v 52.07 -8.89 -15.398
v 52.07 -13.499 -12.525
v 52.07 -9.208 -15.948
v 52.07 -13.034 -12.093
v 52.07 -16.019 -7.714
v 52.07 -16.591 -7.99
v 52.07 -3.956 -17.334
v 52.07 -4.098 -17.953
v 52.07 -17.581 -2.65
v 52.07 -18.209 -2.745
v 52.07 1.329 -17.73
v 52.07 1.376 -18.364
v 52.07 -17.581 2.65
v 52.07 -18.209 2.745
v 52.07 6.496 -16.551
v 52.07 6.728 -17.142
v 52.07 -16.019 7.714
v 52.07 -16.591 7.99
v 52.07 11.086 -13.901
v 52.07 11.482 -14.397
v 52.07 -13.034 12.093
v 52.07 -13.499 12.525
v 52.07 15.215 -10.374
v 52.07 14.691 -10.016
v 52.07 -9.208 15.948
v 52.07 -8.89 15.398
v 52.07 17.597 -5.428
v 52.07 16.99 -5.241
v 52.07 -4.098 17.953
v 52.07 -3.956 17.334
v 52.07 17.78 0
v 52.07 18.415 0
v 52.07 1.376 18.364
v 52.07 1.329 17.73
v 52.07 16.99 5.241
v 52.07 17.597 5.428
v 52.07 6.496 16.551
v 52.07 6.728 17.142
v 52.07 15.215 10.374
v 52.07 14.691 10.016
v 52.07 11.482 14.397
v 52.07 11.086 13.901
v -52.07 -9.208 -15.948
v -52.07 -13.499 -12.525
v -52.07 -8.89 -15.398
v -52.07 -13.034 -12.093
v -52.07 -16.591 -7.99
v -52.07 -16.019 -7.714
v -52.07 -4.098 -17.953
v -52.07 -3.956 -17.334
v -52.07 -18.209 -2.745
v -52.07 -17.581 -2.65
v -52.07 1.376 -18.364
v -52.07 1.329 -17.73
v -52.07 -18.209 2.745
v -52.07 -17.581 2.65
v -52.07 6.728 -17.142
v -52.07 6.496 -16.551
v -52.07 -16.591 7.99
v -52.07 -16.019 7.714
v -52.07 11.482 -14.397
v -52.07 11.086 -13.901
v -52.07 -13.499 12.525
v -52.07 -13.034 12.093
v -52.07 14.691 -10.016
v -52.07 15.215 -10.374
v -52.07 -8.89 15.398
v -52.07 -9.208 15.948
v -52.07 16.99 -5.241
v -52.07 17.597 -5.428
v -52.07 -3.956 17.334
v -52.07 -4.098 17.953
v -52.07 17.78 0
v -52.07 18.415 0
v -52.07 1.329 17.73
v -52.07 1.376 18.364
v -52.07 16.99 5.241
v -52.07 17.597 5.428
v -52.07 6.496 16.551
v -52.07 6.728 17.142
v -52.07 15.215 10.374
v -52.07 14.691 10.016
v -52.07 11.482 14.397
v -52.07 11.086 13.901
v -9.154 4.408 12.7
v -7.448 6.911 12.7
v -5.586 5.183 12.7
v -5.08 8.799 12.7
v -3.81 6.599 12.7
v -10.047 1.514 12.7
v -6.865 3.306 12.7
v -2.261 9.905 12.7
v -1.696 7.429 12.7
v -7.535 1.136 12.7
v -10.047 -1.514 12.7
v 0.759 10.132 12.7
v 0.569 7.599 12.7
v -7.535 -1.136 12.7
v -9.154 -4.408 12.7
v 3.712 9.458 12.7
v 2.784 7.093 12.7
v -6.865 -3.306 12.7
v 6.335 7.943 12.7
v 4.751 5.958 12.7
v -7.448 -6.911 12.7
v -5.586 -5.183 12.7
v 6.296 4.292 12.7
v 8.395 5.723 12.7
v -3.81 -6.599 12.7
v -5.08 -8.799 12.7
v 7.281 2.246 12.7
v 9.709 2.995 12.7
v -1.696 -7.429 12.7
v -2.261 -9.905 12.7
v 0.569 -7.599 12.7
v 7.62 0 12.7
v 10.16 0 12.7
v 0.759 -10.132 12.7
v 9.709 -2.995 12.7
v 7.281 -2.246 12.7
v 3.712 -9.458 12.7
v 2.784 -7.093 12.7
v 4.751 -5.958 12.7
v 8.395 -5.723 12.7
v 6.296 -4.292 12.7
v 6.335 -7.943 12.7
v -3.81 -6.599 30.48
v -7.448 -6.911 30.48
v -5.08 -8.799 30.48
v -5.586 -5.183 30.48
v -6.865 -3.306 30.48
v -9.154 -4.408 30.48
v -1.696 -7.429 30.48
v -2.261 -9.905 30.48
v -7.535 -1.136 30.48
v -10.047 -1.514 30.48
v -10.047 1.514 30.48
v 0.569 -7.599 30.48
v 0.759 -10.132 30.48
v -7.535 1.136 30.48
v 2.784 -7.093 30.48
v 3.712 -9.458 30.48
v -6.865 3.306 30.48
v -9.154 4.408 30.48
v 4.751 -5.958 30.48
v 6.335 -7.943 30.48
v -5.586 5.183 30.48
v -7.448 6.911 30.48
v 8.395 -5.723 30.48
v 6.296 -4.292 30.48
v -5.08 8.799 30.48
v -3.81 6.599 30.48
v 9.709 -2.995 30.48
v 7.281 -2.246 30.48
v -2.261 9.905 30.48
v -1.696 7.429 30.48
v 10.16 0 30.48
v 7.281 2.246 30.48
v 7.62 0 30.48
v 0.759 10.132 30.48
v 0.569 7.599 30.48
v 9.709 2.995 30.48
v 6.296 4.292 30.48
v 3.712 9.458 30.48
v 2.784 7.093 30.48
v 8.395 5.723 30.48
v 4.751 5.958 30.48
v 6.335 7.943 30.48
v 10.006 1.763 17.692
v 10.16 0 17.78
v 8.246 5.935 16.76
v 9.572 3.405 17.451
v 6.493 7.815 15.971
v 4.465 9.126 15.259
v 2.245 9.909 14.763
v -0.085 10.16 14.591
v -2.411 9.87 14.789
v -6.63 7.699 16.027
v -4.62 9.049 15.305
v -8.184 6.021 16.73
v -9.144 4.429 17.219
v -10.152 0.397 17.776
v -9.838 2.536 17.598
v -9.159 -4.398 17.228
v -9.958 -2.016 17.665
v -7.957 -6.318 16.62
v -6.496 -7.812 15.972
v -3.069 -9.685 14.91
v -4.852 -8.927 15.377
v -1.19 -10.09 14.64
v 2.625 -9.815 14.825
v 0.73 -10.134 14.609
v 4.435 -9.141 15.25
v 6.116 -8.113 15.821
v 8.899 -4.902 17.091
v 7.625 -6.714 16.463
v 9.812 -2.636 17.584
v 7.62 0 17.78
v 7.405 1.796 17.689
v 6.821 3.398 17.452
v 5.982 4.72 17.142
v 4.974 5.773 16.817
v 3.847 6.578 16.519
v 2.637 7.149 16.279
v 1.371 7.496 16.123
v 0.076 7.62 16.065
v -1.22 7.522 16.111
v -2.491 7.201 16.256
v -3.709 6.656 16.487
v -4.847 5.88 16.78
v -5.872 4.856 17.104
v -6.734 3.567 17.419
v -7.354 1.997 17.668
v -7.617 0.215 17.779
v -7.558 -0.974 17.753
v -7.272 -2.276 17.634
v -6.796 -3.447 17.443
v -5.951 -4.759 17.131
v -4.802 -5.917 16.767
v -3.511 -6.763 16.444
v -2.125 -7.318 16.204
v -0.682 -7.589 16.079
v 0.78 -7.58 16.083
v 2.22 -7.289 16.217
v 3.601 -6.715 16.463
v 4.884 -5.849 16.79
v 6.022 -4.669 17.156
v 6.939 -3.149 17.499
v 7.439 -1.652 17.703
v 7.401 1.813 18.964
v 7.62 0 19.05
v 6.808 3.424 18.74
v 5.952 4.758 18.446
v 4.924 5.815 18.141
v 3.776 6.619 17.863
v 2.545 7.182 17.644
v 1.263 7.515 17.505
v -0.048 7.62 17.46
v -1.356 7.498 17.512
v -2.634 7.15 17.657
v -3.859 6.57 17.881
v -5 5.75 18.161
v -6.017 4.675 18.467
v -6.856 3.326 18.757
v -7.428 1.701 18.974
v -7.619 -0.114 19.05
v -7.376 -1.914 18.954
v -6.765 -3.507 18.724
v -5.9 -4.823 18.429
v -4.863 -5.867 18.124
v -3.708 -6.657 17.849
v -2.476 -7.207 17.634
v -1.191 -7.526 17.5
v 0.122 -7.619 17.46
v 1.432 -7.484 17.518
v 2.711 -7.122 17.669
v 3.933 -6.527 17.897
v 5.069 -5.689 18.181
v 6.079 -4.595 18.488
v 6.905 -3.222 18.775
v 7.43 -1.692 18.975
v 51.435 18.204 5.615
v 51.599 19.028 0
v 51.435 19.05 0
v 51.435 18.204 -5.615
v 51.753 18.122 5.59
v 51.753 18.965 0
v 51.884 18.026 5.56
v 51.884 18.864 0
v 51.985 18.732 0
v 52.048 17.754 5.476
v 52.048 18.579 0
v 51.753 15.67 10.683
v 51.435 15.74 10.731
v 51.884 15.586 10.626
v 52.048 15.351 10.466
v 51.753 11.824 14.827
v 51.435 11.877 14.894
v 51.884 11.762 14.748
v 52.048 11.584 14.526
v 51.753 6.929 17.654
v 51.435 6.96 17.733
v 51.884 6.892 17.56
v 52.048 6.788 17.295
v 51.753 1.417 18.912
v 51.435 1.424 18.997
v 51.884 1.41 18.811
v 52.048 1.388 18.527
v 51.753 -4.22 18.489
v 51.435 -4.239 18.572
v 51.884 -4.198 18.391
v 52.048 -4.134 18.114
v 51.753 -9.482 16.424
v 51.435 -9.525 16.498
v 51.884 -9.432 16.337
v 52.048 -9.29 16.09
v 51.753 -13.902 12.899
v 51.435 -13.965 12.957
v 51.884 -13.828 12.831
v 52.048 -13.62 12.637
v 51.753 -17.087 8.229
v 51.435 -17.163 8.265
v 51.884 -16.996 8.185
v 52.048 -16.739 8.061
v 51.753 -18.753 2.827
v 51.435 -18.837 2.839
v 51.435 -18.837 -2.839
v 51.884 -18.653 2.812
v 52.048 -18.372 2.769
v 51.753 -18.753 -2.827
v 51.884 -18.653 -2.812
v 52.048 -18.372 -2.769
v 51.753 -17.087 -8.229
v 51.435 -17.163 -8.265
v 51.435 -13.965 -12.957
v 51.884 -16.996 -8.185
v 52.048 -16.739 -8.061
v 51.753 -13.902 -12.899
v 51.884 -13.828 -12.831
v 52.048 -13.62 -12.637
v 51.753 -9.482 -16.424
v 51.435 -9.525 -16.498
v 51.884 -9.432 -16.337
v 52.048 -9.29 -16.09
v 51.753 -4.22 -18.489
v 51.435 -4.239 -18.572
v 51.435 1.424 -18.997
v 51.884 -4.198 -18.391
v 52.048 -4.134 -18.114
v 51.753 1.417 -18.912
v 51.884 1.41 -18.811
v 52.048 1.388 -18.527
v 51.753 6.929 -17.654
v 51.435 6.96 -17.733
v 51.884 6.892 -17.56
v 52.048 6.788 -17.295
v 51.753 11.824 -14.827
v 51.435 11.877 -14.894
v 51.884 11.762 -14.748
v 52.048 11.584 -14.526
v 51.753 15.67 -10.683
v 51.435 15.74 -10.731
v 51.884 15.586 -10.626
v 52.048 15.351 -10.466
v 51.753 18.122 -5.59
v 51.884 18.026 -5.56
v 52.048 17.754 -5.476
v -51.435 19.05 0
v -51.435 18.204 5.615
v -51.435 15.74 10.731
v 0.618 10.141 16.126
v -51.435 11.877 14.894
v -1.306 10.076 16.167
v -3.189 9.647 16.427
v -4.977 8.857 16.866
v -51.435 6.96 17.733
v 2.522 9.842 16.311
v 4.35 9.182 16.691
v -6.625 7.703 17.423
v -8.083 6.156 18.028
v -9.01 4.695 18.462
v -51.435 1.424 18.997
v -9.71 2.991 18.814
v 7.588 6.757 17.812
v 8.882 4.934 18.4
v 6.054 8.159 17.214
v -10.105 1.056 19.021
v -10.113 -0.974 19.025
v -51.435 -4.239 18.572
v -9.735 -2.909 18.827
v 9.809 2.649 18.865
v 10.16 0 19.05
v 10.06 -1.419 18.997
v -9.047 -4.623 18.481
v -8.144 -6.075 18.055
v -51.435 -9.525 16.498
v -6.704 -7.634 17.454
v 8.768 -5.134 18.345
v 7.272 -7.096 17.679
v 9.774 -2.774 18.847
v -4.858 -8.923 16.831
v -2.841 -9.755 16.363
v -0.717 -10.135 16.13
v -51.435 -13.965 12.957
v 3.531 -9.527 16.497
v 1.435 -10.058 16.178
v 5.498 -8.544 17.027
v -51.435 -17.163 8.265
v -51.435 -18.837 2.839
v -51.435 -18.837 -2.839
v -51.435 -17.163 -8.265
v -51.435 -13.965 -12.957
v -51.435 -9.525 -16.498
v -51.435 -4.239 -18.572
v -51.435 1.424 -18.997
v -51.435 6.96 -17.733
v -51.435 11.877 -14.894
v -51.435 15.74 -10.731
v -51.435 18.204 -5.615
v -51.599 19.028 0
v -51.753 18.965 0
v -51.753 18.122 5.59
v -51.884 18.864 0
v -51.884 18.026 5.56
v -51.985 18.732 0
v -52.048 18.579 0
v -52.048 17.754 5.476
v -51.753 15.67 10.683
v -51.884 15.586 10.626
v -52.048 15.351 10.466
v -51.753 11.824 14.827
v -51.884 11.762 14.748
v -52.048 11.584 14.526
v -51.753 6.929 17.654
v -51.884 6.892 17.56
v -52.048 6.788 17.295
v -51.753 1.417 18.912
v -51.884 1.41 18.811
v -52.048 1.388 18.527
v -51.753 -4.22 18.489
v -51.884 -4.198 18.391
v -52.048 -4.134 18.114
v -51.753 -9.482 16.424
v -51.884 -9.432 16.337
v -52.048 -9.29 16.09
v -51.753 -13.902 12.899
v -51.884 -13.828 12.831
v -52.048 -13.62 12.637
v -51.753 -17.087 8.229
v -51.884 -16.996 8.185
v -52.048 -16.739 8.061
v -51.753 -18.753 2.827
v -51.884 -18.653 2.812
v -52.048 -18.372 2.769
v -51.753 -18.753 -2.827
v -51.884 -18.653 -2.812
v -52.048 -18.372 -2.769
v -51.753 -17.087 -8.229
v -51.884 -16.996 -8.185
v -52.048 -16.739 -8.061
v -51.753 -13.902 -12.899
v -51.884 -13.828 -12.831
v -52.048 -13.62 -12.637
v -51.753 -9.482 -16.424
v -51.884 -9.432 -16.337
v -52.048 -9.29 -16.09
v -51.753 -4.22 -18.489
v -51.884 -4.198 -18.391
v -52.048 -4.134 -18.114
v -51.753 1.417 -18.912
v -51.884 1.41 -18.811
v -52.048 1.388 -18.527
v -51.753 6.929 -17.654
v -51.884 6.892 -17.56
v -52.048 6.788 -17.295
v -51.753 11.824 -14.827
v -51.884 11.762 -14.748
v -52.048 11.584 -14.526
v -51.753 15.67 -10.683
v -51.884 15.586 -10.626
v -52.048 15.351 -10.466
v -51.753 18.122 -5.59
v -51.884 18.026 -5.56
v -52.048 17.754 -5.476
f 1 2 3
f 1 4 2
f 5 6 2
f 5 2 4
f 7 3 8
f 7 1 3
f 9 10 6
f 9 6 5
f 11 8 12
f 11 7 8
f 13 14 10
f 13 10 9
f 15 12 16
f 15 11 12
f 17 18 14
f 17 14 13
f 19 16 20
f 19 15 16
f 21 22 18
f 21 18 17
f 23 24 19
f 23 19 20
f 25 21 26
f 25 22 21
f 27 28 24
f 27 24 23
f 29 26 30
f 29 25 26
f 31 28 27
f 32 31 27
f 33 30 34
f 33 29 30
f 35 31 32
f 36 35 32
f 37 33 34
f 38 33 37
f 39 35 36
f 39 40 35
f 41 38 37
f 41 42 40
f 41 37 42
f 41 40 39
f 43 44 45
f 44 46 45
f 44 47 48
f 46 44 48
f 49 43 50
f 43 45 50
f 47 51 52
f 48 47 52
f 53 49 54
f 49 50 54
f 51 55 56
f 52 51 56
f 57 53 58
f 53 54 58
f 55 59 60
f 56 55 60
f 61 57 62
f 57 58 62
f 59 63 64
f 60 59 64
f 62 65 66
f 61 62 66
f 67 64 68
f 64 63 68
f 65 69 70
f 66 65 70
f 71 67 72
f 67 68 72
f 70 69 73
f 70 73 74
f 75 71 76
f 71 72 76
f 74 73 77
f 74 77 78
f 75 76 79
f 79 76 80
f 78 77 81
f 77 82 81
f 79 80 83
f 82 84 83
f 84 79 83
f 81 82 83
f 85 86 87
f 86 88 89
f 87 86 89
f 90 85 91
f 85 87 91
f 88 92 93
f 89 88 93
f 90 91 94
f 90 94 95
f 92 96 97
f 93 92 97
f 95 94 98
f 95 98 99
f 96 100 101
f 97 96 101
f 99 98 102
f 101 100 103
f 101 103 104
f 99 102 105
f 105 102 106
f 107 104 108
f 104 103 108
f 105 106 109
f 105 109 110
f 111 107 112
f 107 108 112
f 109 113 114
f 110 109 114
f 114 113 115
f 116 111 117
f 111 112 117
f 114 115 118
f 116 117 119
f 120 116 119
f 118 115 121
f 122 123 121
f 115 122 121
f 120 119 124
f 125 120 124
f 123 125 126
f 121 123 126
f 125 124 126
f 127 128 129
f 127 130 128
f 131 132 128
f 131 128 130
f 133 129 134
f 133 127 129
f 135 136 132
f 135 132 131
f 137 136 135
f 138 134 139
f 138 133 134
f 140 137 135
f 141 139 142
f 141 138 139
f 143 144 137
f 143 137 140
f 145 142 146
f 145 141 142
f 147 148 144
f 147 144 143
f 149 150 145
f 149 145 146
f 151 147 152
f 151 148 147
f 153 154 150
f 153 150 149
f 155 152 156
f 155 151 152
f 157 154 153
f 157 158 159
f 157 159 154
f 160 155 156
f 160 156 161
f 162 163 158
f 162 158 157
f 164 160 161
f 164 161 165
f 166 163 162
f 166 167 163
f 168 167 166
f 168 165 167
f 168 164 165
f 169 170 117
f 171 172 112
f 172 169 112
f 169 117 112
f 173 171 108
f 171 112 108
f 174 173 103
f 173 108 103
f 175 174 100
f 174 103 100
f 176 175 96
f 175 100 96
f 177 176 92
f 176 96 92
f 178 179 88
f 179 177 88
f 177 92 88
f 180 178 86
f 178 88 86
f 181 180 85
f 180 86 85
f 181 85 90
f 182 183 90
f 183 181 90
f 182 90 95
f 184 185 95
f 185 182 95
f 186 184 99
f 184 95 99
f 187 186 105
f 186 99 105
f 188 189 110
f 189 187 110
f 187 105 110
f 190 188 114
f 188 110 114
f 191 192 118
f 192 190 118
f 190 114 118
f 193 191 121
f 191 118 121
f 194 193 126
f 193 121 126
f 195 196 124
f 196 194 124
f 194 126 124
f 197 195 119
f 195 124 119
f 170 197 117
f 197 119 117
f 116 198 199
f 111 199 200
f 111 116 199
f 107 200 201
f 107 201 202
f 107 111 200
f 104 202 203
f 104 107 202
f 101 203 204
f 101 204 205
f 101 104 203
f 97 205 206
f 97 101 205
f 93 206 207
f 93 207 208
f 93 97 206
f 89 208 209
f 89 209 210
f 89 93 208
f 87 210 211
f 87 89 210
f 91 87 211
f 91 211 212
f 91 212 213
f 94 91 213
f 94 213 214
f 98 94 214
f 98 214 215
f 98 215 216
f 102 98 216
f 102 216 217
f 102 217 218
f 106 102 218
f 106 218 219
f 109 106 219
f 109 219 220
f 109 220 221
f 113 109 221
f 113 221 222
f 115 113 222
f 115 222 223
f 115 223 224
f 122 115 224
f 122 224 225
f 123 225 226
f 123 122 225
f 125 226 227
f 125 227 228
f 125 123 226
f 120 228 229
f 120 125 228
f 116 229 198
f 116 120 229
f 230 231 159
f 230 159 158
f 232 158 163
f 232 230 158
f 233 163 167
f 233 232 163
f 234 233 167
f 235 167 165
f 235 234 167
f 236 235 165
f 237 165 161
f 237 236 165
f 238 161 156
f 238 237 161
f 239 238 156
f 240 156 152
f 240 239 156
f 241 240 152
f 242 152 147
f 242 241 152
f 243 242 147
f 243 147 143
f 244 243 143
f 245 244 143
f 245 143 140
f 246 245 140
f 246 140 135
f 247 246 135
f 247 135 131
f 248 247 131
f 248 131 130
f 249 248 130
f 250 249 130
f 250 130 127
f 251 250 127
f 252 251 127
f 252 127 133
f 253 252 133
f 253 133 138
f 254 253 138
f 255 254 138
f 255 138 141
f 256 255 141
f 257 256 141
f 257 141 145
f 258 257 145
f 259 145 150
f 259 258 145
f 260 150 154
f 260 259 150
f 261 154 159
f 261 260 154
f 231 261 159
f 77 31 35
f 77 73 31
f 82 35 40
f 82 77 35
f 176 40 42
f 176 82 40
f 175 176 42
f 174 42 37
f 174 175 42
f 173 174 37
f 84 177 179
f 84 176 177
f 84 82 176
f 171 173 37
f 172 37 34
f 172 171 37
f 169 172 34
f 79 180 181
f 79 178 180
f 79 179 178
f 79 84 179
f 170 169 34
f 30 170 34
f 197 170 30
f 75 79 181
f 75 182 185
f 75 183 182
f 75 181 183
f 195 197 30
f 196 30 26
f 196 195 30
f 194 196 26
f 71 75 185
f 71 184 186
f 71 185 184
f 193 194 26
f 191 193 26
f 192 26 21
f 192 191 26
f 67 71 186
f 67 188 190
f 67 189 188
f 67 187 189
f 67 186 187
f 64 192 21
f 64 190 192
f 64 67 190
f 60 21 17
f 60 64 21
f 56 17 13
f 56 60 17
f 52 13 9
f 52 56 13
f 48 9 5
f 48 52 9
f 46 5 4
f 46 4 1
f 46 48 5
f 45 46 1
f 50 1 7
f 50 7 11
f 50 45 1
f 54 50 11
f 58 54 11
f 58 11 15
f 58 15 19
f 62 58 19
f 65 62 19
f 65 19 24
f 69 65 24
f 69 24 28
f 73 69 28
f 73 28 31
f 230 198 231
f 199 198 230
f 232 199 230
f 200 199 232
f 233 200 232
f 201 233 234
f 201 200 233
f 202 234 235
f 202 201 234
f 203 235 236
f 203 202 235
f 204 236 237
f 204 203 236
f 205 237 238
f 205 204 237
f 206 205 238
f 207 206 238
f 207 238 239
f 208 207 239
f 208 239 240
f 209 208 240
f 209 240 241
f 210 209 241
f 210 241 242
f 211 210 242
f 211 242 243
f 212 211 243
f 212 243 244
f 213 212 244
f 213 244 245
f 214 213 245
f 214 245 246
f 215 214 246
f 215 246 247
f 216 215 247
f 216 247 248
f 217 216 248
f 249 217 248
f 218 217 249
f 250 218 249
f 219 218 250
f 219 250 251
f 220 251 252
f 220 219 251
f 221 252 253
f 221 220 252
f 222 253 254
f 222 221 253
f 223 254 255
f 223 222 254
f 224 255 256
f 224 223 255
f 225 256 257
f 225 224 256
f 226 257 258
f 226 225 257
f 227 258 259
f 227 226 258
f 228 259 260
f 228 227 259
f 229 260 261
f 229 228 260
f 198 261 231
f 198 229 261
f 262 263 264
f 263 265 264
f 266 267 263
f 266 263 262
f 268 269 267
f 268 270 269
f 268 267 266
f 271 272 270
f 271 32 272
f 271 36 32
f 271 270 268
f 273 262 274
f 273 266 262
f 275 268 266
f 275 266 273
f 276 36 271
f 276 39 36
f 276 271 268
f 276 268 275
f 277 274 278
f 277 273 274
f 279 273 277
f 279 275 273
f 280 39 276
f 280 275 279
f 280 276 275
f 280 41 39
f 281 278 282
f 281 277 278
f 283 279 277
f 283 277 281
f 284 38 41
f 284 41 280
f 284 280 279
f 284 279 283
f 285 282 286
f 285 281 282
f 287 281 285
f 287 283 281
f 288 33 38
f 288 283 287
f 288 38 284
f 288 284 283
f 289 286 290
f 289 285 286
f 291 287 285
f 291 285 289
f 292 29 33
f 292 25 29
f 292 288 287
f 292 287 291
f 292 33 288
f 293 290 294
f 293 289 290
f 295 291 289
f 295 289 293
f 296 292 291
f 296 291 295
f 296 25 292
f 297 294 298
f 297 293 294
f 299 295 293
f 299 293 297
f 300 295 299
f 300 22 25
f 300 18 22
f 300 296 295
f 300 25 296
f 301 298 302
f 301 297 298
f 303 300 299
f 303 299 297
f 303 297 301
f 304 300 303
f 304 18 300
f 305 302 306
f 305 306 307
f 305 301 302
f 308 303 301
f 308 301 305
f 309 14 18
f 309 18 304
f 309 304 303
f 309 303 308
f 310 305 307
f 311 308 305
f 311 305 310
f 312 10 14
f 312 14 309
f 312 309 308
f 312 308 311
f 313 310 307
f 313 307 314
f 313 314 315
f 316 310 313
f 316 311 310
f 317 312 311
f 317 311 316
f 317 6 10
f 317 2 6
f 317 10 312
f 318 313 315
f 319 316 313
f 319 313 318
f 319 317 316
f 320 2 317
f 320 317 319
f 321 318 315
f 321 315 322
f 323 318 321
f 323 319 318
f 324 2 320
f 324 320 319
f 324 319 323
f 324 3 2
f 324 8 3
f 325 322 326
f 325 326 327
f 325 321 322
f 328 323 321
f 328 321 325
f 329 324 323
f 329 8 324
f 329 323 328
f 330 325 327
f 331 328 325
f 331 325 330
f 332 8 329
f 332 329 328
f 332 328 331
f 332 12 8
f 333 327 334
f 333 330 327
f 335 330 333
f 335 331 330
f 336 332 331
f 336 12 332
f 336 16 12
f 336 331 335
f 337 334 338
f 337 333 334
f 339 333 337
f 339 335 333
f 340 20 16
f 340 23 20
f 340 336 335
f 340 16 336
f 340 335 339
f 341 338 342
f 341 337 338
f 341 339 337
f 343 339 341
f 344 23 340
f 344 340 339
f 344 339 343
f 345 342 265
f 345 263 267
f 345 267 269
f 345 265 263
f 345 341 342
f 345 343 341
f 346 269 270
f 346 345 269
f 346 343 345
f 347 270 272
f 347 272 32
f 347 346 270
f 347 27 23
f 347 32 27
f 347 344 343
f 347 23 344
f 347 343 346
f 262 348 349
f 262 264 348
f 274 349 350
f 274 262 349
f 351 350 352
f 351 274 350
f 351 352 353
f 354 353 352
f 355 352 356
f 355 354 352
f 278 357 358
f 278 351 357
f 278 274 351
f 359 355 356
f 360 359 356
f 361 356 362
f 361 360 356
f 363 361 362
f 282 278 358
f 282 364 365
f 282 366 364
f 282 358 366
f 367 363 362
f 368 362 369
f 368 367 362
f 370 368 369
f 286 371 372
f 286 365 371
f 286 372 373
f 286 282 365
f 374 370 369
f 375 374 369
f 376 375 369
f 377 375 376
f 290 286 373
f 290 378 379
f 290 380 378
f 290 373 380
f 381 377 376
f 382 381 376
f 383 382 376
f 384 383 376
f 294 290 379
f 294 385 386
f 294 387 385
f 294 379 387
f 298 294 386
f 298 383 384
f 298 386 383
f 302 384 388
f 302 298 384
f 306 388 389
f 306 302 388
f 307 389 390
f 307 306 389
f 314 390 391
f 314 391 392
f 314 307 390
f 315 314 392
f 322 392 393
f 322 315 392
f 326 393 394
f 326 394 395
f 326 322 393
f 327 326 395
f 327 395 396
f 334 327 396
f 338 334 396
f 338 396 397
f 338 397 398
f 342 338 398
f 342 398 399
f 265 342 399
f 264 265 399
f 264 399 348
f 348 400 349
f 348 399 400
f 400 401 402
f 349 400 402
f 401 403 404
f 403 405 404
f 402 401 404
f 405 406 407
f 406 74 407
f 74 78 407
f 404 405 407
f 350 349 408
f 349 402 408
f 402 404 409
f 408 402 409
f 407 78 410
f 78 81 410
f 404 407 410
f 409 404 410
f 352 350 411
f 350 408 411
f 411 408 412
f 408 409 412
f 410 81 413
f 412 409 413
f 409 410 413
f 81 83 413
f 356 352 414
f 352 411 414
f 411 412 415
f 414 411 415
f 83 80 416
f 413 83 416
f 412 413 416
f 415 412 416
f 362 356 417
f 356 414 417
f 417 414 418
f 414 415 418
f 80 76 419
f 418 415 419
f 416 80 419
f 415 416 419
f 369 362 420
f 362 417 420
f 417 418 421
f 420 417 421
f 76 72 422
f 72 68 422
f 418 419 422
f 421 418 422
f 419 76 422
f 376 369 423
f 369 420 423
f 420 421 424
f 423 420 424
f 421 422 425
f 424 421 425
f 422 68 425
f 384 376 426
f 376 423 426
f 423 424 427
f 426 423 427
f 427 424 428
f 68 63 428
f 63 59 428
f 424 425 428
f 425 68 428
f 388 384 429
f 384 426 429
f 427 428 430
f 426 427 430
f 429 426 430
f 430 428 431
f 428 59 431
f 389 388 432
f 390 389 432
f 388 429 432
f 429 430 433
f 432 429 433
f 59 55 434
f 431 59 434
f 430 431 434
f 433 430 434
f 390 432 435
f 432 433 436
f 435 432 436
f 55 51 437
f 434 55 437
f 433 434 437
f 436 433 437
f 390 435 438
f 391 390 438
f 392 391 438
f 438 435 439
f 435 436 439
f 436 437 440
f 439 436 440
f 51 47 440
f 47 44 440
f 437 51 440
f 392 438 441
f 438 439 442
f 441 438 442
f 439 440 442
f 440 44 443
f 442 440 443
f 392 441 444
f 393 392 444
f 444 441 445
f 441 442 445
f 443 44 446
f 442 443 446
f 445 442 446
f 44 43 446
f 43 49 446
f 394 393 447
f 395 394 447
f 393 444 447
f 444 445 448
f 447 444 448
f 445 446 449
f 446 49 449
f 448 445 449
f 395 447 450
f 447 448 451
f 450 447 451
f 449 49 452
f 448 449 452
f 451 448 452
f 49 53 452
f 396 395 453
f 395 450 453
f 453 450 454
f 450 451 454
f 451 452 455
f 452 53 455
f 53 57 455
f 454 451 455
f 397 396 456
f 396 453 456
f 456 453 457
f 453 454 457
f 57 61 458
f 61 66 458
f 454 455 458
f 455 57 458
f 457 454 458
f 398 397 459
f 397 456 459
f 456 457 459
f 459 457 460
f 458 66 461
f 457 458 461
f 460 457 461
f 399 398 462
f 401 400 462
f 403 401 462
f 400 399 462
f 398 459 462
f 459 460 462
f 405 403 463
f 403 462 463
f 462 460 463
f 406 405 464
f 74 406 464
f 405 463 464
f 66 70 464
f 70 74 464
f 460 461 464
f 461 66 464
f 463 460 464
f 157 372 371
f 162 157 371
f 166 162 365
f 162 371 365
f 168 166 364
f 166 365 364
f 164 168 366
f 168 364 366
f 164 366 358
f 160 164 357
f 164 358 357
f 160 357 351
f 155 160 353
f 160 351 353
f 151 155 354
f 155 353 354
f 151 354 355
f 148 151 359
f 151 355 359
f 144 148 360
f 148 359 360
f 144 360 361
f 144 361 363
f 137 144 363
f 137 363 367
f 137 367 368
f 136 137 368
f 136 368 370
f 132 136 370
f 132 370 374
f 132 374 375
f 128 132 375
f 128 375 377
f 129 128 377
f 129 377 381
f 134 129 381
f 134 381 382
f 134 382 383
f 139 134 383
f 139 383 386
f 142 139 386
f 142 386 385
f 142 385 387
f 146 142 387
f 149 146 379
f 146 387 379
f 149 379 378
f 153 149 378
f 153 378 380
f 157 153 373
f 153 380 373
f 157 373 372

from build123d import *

# Parameters (mm, degrees)
F0_R     = 19.05
F0_R_2   = 17.78
F1_DEPTH = 52.07
F2_R     = 0.635
F3_R     = 10.16
F3_R_2   = 7.62
F4_DEPTH = 30.48
F5_R     = 7.62
F6_DEPTH = 30.481
F8_DEPTH = 25.4


with BuildPart() as f1:
    # F0 (on Right) → F1 (new body, symmetric)
    with BuildSketch(Plane.YZ):
        Circle(F0_R)
        Circle(F0_R_2, mode=Mode.SUBTRACT)
    extrude(amount=F1_DEPTH, both=True)

    # F2
    f2_edges = [f1.edges().sort_by_distance(p)[0] for p in [
        (52.07, -19.05, 0),
        (-52.07, -19.05, 0),
    ]]
    fillet(f2_edges, radius=F2_R)

    # F3 (on Top) → F4 (join)
    with BuildSketch(Plane.XY):
        Circle(F3_R)
        Circle(F3_R_2, mode=Mode.SUBTRACT)
    extrude(amount=F4_DEPTH)

    # F5 (on Top) → F6 (cut, through all)
    with BuildSketch(Plane.XY):
        Circle(F5_R)
    extrude(amount=F6_DEPTH, mode=Mode.SUBTRACT)

    # F7 (on Right) → F8 (cut, symmetric)
    with BuildSketch(Plane.YZ):
        with BuildLine():
            Line((-10.16, 12.7), (-10.16, 14.591189))
            ThreePointArc((-10.16, 14.591189), (0, -17.78), (10.16, 14.591189))
            Line((10.16, 14.591189), (10.16, 12.7))
            Line((10.16, 12.7), (-10.16, 12.7))
        make_face()
    extrude(amount=F8_DEPTH, both=True, mode=Mode.SUBTRACT)


solid = f1.part
